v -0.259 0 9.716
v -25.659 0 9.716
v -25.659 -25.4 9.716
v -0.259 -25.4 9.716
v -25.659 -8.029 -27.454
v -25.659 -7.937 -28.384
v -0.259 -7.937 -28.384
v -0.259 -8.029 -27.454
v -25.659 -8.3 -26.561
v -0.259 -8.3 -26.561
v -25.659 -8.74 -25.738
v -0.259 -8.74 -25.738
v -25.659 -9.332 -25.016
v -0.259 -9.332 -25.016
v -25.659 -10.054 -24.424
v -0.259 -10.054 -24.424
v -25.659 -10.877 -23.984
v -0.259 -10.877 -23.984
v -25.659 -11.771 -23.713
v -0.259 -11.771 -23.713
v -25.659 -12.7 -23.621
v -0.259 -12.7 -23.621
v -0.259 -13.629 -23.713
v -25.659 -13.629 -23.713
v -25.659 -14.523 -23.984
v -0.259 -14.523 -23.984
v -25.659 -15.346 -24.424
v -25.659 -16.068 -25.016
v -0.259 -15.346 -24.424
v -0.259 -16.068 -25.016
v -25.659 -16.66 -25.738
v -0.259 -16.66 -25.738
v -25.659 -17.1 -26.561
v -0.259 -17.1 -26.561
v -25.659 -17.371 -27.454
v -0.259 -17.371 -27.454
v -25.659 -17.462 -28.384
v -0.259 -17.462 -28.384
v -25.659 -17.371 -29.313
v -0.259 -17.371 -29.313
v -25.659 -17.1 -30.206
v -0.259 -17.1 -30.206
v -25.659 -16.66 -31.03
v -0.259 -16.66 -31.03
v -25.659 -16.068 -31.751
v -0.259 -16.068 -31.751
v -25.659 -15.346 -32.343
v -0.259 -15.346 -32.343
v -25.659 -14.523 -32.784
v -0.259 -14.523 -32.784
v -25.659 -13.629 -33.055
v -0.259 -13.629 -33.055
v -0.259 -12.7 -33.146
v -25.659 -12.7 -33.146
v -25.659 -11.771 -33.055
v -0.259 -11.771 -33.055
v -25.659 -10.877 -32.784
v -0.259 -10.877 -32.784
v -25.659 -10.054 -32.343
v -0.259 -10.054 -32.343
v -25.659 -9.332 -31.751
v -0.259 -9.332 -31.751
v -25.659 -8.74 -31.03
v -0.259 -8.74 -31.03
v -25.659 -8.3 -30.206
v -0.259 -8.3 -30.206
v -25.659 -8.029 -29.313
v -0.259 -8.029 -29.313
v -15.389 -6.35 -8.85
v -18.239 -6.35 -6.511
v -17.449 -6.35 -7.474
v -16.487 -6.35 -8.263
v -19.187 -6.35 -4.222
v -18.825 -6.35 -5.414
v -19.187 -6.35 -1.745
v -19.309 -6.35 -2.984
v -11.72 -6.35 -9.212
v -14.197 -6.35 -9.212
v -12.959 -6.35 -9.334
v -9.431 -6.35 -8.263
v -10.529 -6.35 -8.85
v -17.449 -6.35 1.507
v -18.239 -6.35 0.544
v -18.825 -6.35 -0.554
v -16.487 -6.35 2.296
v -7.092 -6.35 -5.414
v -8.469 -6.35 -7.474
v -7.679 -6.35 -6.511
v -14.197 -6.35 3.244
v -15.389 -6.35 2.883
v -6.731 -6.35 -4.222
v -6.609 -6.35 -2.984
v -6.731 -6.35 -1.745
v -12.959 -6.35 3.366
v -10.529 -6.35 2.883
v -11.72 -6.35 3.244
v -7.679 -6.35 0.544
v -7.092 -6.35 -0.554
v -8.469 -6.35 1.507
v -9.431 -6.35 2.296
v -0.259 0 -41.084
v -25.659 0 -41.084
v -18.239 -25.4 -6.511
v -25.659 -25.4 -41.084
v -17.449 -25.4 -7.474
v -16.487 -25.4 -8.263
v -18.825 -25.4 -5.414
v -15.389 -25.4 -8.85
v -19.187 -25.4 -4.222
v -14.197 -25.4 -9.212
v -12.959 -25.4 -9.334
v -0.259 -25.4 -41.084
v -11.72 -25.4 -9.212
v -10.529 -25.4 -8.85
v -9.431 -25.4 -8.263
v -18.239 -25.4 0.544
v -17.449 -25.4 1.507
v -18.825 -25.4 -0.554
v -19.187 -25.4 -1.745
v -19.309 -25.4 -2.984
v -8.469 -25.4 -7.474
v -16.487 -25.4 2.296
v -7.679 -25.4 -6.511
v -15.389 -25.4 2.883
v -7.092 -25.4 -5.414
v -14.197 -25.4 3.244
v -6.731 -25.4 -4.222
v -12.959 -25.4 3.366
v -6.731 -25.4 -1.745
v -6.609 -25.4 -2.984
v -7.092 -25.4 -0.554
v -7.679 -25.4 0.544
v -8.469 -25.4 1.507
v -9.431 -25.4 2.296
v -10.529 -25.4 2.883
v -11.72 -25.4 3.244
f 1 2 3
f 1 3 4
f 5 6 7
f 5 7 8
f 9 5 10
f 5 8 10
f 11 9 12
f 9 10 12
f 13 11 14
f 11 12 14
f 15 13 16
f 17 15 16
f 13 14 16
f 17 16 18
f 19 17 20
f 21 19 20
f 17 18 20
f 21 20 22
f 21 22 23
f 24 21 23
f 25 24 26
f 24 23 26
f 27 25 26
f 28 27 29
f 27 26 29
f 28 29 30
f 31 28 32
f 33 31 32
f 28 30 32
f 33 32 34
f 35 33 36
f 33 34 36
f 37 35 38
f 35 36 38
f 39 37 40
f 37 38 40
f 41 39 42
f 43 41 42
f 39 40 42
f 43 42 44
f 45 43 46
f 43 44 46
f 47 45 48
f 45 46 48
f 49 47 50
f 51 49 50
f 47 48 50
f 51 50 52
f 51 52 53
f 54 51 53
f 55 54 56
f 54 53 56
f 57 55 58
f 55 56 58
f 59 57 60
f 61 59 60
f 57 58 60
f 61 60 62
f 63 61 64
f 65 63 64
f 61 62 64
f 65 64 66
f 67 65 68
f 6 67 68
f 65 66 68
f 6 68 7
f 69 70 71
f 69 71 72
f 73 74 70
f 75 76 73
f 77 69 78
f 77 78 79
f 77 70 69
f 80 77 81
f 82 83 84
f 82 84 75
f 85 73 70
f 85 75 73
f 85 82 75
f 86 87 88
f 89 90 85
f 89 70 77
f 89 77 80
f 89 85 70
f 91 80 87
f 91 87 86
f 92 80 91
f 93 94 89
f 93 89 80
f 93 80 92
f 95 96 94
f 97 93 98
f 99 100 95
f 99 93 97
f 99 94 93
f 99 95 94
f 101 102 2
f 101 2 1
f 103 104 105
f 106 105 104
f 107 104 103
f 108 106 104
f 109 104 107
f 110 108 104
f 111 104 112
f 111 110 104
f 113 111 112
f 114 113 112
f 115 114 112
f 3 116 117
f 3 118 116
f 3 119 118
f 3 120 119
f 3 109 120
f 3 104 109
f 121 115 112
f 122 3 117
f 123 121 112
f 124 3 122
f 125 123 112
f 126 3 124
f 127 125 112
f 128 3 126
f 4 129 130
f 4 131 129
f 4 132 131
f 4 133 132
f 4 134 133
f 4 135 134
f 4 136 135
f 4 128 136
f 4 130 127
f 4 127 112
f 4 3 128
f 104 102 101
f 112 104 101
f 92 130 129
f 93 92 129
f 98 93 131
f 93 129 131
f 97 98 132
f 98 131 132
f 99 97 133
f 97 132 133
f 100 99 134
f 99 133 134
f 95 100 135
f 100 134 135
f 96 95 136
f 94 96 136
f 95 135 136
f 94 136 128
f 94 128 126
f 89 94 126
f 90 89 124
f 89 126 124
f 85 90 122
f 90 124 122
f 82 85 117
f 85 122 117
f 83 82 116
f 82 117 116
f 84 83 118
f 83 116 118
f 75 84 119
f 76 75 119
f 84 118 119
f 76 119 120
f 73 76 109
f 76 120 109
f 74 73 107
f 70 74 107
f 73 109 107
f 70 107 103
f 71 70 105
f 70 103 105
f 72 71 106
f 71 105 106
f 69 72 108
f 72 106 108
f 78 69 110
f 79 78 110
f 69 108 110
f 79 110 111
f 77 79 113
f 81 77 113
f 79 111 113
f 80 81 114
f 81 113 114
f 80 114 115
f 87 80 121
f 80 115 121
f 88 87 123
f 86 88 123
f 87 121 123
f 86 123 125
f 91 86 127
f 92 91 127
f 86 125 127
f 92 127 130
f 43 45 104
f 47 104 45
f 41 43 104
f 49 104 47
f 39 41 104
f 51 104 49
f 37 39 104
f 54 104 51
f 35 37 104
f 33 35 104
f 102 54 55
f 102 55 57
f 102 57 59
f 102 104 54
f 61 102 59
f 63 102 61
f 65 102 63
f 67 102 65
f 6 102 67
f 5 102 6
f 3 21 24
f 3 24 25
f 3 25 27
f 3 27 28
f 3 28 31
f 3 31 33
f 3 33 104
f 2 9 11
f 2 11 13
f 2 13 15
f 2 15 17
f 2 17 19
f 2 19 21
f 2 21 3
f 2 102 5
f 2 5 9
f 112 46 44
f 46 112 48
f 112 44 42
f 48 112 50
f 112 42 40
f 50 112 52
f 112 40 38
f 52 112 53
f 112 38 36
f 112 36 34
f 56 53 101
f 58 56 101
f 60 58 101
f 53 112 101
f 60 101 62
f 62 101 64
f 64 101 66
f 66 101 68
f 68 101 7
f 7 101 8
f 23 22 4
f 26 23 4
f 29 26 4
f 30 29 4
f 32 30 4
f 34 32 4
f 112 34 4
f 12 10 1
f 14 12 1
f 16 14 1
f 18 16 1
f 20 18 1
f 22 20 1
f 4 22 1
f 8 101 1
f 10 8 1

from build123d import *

# Parameters (mm, degrees)
F0_W     = 25.4
F0_H     = 50.8
F1_DEPTH = 25.4
F2_R     = 6.35
F3_DEPTH = 19.05
F4_R     = 4.7625
F5_DEPTH = 25.4


with BuildPart() as f1:
    # F0 (on Front) → F1 (new body)
    with BuildSketch(Plane.XZ):
        with Locations((-12.958675, -15.683598)):
            Rectangle(F0_W, F0_H)
    extrude(amount=F1_DEPTH)

    # F2 (on face) → F3 (cut)
    with BuildSketch(Plane.XZ.offset(25.4)):
        with Locations((-12.958675, -2.983598)):
            Circle(F2_R)
    extrude(amount=-F3_DEPTH, mode=Mode.SUBTRACT)

    # F4 (on face) → F5 (cut)
    with BuildSketch(Plane.YZ.offset(-0.258675)):
        with Locations((-12.7, -28.383598)):
            Circle(F4_R)
    extrude(amount=-F5_DEPTH, mode=Mode.SUBTRACT)


solid = f1.part
